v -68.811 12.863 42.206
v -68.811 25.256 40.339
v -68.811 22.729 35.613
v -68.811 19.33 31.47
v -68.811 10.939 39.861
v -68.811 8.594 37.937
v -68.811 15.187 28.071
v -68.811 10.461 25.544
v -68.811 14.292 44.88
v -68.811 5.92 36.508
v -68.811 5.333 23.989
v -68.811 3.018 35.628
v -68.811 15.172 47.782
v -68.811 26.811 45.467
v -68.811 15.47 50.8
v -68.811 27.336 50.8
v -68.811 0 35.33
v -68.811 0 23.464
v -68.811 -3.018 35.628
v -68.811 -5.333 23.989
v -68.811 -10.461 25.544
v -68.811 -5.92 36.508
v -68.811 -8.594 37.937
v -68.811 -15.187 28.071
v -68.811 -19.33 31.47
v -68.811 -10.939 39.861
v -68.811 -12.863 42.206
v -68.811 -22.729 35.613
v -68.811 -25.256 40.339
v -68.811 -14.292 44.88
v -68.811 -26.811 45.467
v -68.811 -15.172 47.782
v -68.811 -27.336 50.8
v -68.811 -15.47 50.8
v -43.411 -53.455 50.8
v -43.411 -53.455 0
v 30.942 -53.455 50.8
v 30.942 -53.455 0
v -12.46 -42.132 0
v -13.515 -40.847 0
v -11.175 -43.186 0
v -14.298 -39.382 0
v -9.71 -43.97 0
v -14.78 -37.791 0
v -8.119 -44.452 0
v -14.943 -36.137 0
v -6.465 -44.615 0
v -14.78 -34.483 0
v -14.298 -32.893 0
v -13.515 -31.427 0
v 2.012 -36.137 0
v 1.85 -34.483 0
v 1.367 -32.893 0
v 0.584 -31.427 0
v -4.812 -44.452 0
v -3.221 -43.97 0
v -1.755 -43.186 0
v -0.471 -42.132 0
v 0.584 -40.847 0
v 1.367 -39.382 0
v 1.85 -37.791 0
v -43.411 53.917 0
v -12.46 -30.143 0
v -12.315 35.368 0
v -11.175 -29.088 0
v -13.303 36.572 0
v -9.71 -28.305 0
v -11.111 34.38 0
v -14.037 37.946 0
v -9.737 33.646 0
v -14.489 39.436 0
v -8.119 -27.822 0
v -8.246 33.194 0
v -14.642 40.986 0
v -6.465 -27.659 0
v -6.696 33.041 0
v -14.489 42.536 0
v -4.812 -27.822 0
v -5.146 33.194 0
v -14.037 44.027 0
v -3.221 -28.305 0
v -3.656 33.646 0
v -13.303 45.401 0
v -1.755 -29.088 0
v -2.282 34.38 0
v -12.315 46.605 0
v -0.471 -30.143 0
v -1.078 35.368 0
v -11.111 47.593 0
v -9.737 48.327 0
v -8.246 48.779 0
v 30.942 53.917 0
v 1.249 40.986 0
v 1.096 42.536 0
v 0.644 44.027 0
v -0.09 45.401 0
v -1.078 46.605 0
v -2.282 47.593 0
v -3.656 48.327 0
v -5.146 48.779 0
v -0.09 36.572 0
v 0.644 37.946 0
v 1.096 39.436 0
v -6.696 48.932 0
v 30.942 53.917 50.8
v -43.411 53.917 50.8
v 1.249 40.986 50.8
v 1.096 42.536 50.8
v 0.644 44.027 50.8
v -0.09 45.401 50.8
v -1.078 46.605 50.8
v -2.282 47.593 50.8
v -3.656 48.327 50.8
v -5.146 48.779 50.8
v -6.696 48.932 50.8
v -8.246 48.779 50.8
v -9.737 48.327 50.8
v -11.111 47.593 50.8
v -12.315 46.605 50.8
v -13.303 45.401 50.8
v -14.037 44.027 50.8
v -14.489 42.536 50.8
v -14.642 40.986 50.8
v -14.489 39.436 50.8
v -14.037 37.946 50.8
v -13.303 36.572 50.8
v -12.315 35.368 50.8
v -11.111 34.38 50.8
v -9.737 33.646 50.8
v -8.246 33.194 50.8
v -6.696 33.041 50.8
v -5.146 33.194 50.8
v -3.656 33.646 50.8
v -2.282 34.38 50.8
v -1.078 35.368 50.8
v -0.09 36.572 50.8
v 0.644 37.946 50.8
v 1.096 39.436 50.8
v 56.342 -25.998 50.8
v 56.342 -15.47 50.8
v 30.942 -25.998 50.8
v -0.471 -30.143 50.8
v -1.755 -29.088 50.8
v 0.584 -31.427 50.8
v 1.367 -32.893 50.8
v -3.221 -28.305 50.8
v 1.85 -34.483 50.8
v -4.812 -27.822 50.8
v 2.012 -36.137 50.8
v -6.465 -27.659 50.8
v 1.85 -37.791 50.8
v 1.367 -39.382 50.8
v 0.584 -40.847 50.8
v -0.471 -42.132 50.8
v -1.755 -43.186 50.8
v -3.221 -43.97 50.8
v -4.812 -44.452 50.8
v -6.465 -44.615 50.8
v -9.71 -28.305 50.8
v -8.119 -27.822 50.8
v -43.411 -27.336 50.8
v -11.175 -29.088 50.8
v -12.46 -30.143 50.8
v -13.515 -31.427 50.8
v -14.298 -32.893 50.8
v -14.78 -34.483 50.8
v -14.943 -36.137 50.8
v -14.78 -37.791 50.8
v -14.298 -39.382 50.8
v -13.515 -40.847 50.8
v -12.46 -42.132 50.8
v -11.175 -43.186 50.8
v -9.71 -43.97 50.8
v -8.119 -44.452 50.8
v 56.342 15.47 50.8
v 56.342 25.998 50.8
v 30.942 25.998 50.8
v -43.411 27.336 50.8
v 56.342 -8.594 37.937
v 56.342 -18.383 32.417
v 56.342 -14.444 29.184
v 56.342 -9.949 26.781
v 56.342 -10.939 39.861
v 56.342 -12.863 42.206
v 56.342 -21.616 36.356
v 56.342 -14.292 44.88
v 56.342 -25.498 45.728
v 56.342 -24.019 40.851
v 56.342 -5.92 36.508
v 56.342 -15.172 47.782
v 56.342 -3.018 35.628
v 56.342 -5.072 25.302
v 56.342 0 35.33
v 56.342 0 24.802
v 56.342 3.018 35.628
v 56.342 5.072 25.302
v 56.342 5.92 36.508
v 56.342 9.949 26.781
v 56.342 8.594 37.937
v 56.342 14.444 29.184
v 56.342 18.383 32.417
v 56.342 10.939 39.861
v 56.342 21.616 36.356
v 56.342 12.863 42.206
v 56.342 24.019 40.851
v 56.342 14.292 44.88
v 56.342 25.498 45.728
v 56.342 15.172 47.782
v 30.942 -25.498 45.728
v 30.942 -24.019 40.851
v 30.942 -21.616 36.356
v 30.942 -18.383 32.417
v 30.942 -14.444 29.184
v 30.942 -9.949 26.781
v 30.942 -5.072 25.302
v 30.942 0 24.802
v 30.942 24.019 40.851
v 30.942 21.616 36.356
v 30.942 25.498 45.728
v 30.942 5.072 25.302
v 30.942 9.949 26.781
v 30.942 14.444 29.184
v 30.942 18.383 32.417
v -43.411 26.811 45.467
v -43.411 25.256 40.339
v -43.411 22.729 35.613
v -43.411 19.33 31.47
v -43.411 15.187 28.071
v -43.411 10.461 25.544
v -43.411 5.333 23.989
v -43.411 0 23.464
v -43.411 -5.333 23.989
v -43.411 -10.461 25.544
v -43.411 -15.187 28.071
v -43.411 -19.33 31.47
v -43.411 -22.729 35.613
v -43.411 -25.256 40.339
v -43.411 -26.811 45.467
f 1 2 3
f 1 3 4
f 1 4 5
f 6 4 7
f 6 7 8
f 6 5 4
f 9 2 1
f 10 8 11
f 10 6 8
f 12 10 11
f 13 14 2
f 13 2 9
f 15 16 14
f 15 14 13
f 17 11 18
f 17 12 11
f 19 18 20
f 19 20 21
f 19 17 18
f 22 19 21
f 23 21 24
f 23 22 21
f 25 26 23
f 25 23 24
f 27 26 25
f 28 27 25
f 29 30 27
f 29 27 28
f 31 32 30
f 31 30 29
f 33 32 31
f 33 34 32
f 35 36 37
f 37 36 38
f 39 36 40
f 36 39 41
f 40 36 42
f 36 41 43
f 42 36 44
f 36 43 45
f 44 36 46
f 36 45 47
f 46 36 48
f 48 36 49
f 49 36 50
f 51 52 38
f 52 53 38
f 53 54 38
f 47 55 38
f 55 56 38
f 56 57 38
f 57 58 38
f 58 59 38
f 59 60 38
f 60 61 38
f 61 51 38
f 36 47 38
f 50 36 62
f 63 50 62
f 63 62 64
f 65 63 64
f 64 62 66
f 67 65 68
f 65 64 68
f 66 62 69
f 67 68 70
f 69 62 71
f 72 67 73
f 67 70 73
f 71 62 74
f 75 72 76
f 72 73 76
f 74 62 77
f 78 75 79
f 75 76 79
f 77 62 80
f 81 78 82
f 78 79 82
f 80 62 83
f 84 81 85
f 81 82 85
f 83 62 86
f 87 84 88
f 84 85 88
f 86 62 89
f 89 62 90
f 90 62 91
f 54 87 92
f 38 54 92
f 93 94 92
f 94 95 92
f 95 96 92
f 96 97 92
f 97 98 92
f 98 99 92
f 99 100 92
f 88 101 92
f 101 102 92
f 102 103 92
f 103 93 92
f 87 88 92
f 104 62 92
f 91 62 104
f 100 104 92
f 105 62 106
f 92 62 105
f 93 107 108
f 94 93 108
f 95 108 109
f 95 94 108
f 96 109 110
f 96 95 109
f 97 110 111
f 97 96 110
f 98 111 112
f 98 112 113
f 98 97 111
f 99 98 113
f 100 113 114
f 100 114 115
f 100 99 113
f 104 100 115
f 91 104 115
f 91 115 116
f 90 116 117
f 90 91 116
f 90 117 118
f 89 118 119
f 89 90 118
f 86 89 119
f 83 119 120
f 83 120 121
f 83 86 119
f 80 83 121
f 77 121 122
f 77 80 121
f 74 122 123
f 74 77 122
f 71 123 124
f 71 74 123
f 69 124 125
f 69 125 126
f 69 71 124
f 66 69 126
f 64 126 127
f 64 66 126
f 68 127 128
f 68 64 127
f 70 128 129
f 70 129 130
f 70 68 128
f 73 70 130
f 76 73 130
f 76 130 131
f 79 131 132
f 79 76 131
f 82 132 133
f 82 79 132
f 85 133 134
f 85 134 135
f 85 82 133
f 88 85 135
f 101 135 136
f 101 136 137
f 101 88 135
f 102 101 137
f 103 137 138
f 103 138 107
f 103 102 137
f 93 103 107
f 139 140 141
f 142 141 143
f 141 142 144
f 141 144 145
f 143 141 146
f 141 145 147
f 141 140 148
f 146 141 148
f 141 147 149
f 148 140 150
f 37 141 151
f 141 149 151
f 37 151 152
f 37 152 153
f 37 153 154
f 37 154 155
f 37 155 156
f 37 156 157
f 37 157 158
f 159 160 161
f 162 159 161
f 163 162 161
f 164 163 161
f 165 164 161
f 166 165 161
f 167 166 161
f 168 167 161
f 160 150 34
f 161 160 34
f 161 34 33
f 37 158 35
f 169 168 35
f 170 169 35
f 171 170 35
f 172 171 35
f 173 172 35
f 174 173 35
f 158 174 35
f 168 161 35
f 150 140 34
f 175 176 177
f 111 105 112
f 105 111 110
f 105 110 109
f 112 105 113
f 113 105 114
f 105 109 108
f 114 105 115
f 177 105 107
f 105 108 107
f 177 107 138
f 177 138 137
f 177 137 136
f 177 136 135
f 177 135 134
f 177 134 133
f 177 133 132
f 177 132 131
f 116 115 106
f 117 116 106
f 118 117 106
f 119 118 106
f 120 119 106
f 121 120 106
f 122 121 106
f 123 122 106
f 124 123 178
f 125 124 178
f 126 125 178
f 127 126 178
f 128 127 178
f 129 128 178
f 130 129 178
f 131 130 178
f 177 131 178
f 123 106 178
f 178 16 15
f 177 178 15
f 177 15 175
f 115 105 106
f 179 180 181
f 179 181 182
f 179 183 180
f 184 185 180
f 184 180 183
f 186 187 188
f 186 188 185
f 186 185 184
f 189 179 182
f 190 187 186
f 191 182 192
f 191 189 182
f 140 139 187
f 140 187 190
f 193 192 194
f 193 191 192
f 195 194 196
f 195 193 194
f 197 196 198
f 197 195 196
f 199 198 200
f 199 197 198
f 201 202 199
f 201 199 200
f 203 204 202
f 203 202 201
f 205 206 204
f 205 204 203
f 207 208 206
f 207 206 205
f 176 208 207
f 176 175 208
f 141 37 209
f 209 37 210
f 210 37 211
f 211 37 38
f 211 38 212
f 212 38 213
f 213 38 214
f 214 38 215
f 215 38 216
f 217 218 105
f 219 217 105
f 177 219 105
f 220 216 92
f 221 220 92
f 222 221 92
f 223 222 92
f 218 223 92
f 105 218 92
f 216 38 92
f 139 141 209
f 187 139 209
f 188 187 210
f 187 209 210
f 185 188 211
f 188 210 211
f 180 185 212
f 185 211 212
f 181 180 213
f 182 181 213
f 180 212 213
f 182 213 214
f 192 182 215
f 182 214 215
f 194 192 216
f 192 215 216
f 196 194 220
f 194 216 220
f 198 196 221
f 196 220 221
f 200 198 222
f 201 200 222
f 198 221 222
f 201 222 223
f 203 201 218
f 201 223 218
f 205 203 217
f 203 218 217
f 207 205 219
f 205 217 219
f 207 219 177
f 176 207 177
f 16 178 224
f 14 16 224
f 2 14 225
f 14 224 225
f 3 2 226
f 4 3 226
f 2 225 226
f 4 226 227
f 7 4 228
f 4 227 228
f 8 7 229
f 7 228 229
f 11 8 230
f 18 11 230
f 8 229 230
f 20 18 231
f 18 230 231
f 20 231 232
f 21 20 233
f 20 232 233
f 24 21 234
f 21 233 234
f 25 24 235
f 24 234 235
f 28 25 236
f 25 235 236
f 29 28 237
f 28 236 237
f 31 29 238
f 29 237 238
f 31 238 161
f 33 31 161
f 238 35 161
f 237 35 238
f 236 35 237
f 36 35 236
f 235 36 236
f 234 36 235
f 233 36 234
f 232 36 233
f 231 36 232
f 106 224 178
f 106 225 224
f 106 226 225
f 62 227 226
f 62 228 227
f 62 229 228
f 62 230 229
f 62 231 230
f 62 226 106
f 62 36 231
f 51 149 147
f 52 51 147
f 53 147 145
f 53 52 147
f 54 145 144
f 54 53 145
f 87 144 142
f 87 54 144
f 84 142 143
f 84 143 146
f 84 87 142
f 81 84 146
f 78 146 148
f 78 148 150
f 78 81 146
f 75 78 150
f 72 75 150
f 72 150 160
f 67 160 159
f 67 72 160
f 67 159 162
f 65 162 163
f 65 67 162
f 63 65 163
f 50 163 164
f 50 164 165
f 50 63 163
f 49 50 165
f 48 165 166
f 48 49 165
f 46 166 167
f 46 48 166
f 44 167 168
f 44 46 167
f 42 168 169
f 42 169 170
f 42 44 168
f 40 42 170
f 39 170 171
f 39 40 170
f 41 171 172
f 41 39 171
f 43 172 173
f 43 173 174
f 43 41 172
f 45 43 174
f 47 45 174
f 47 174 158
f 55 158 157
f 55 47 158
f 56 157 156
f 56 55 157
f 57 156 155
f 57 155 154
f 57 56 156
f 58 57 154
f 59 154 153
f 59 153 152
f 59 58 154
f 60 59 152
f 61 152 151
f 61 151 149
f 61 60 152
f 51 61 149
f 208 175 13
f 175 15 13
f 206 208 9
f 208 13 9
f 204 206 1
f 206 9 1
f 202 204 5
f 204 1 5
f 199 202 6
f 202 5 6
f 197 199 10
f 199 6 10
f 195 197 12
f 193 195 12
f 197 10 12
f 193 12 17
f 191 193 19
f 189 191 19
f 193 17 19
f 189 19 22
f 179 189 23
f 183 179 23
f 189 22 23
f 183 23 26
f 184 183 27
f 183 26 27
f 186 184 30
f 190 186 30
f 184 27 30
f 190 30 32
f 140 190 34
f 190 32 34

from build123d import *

# Parameters (mm, degrees)
F0_W     = 74.3527244776
F0_H     = 107.3727235198
F0_R     = 8.4778544631
F0_R_2   = 7.9454205322
F1_DEPTH = 50.8
F3_DEPTH = 25.4
F4_DEPTH = 76.2
F6_DEPTH = 25.4


with BuildPart() as f1:
    # F0 (on Top) → F1 (new body)
    with BuildSketch(Plane.XY):
        with Locations((-6.234546192, 0.2309083939)):
            Rectangle(F0_W, F0_H)
        with Locations((-6.4654541202, -36.1372716725)):
            Circle(F0_R, mode=Mode.SUBTRACT)
        with Locations((-6.6963643767, 40.9863628447)):
            Circle(F0_R_2, mode=Mode.SUBTRACT)
    extrude(amount=F1_DEPTH)

    # F2 (on face) → F3 (join)
    with BuildSketch(Plane(origin=(-43.4109084308, 0, 0), x_dir=(0, -1, 0), z_dir=(-1, 0, 0))):
        with BuildLine():
            ThreePointArc((-27.3364075131, 50.8), (0, 23.4635924869), (27.3364075131, 50.8))
            Line((27.3364075131, 50.8), (15.4696153843, 50.8))
            ThreePointArc((15.4696153843, 50.8), (0, 35.3303846157), (-15.4696153843, 50.8))
            Line((-15.4696153843, 50.8), (-27.3364075131, 50.8))
        make_face()
    extrude(amount=F3_DEPTH)

    # F4 (cut): a face of the model
    f4_faces = [f1.faces().sort_by_distance(p)[0] for p in [
        (-43.4109084308, 0, 44.234491317),
    ]]
    extrude(f4_faces, amount=-F4_DEPTH, mode=Mode.SUBTRACT)

    # F5 (on face) → F6 (join)
    with BuildSketch(Plane.YZ.offset(30.9418160468)):
        with BuildLine():
            ThreePointArc((-25.9977905066, 50.8), (0, 24.8022094934), (25.9977905066, 50.8))
            Line((25.9977905066, 50.8), (15.4696153843, 50.8))
            ThreePointArc((15.4696153843, 50.8), (0, 35.3303846157), (-15.4696153843, 50.8))
            Line((-15.4696153843, 50.8), (-25.9977905066, 50.8))
        make_face()
    extrude(amount=F6_DEPTH)


solid = f1.part
